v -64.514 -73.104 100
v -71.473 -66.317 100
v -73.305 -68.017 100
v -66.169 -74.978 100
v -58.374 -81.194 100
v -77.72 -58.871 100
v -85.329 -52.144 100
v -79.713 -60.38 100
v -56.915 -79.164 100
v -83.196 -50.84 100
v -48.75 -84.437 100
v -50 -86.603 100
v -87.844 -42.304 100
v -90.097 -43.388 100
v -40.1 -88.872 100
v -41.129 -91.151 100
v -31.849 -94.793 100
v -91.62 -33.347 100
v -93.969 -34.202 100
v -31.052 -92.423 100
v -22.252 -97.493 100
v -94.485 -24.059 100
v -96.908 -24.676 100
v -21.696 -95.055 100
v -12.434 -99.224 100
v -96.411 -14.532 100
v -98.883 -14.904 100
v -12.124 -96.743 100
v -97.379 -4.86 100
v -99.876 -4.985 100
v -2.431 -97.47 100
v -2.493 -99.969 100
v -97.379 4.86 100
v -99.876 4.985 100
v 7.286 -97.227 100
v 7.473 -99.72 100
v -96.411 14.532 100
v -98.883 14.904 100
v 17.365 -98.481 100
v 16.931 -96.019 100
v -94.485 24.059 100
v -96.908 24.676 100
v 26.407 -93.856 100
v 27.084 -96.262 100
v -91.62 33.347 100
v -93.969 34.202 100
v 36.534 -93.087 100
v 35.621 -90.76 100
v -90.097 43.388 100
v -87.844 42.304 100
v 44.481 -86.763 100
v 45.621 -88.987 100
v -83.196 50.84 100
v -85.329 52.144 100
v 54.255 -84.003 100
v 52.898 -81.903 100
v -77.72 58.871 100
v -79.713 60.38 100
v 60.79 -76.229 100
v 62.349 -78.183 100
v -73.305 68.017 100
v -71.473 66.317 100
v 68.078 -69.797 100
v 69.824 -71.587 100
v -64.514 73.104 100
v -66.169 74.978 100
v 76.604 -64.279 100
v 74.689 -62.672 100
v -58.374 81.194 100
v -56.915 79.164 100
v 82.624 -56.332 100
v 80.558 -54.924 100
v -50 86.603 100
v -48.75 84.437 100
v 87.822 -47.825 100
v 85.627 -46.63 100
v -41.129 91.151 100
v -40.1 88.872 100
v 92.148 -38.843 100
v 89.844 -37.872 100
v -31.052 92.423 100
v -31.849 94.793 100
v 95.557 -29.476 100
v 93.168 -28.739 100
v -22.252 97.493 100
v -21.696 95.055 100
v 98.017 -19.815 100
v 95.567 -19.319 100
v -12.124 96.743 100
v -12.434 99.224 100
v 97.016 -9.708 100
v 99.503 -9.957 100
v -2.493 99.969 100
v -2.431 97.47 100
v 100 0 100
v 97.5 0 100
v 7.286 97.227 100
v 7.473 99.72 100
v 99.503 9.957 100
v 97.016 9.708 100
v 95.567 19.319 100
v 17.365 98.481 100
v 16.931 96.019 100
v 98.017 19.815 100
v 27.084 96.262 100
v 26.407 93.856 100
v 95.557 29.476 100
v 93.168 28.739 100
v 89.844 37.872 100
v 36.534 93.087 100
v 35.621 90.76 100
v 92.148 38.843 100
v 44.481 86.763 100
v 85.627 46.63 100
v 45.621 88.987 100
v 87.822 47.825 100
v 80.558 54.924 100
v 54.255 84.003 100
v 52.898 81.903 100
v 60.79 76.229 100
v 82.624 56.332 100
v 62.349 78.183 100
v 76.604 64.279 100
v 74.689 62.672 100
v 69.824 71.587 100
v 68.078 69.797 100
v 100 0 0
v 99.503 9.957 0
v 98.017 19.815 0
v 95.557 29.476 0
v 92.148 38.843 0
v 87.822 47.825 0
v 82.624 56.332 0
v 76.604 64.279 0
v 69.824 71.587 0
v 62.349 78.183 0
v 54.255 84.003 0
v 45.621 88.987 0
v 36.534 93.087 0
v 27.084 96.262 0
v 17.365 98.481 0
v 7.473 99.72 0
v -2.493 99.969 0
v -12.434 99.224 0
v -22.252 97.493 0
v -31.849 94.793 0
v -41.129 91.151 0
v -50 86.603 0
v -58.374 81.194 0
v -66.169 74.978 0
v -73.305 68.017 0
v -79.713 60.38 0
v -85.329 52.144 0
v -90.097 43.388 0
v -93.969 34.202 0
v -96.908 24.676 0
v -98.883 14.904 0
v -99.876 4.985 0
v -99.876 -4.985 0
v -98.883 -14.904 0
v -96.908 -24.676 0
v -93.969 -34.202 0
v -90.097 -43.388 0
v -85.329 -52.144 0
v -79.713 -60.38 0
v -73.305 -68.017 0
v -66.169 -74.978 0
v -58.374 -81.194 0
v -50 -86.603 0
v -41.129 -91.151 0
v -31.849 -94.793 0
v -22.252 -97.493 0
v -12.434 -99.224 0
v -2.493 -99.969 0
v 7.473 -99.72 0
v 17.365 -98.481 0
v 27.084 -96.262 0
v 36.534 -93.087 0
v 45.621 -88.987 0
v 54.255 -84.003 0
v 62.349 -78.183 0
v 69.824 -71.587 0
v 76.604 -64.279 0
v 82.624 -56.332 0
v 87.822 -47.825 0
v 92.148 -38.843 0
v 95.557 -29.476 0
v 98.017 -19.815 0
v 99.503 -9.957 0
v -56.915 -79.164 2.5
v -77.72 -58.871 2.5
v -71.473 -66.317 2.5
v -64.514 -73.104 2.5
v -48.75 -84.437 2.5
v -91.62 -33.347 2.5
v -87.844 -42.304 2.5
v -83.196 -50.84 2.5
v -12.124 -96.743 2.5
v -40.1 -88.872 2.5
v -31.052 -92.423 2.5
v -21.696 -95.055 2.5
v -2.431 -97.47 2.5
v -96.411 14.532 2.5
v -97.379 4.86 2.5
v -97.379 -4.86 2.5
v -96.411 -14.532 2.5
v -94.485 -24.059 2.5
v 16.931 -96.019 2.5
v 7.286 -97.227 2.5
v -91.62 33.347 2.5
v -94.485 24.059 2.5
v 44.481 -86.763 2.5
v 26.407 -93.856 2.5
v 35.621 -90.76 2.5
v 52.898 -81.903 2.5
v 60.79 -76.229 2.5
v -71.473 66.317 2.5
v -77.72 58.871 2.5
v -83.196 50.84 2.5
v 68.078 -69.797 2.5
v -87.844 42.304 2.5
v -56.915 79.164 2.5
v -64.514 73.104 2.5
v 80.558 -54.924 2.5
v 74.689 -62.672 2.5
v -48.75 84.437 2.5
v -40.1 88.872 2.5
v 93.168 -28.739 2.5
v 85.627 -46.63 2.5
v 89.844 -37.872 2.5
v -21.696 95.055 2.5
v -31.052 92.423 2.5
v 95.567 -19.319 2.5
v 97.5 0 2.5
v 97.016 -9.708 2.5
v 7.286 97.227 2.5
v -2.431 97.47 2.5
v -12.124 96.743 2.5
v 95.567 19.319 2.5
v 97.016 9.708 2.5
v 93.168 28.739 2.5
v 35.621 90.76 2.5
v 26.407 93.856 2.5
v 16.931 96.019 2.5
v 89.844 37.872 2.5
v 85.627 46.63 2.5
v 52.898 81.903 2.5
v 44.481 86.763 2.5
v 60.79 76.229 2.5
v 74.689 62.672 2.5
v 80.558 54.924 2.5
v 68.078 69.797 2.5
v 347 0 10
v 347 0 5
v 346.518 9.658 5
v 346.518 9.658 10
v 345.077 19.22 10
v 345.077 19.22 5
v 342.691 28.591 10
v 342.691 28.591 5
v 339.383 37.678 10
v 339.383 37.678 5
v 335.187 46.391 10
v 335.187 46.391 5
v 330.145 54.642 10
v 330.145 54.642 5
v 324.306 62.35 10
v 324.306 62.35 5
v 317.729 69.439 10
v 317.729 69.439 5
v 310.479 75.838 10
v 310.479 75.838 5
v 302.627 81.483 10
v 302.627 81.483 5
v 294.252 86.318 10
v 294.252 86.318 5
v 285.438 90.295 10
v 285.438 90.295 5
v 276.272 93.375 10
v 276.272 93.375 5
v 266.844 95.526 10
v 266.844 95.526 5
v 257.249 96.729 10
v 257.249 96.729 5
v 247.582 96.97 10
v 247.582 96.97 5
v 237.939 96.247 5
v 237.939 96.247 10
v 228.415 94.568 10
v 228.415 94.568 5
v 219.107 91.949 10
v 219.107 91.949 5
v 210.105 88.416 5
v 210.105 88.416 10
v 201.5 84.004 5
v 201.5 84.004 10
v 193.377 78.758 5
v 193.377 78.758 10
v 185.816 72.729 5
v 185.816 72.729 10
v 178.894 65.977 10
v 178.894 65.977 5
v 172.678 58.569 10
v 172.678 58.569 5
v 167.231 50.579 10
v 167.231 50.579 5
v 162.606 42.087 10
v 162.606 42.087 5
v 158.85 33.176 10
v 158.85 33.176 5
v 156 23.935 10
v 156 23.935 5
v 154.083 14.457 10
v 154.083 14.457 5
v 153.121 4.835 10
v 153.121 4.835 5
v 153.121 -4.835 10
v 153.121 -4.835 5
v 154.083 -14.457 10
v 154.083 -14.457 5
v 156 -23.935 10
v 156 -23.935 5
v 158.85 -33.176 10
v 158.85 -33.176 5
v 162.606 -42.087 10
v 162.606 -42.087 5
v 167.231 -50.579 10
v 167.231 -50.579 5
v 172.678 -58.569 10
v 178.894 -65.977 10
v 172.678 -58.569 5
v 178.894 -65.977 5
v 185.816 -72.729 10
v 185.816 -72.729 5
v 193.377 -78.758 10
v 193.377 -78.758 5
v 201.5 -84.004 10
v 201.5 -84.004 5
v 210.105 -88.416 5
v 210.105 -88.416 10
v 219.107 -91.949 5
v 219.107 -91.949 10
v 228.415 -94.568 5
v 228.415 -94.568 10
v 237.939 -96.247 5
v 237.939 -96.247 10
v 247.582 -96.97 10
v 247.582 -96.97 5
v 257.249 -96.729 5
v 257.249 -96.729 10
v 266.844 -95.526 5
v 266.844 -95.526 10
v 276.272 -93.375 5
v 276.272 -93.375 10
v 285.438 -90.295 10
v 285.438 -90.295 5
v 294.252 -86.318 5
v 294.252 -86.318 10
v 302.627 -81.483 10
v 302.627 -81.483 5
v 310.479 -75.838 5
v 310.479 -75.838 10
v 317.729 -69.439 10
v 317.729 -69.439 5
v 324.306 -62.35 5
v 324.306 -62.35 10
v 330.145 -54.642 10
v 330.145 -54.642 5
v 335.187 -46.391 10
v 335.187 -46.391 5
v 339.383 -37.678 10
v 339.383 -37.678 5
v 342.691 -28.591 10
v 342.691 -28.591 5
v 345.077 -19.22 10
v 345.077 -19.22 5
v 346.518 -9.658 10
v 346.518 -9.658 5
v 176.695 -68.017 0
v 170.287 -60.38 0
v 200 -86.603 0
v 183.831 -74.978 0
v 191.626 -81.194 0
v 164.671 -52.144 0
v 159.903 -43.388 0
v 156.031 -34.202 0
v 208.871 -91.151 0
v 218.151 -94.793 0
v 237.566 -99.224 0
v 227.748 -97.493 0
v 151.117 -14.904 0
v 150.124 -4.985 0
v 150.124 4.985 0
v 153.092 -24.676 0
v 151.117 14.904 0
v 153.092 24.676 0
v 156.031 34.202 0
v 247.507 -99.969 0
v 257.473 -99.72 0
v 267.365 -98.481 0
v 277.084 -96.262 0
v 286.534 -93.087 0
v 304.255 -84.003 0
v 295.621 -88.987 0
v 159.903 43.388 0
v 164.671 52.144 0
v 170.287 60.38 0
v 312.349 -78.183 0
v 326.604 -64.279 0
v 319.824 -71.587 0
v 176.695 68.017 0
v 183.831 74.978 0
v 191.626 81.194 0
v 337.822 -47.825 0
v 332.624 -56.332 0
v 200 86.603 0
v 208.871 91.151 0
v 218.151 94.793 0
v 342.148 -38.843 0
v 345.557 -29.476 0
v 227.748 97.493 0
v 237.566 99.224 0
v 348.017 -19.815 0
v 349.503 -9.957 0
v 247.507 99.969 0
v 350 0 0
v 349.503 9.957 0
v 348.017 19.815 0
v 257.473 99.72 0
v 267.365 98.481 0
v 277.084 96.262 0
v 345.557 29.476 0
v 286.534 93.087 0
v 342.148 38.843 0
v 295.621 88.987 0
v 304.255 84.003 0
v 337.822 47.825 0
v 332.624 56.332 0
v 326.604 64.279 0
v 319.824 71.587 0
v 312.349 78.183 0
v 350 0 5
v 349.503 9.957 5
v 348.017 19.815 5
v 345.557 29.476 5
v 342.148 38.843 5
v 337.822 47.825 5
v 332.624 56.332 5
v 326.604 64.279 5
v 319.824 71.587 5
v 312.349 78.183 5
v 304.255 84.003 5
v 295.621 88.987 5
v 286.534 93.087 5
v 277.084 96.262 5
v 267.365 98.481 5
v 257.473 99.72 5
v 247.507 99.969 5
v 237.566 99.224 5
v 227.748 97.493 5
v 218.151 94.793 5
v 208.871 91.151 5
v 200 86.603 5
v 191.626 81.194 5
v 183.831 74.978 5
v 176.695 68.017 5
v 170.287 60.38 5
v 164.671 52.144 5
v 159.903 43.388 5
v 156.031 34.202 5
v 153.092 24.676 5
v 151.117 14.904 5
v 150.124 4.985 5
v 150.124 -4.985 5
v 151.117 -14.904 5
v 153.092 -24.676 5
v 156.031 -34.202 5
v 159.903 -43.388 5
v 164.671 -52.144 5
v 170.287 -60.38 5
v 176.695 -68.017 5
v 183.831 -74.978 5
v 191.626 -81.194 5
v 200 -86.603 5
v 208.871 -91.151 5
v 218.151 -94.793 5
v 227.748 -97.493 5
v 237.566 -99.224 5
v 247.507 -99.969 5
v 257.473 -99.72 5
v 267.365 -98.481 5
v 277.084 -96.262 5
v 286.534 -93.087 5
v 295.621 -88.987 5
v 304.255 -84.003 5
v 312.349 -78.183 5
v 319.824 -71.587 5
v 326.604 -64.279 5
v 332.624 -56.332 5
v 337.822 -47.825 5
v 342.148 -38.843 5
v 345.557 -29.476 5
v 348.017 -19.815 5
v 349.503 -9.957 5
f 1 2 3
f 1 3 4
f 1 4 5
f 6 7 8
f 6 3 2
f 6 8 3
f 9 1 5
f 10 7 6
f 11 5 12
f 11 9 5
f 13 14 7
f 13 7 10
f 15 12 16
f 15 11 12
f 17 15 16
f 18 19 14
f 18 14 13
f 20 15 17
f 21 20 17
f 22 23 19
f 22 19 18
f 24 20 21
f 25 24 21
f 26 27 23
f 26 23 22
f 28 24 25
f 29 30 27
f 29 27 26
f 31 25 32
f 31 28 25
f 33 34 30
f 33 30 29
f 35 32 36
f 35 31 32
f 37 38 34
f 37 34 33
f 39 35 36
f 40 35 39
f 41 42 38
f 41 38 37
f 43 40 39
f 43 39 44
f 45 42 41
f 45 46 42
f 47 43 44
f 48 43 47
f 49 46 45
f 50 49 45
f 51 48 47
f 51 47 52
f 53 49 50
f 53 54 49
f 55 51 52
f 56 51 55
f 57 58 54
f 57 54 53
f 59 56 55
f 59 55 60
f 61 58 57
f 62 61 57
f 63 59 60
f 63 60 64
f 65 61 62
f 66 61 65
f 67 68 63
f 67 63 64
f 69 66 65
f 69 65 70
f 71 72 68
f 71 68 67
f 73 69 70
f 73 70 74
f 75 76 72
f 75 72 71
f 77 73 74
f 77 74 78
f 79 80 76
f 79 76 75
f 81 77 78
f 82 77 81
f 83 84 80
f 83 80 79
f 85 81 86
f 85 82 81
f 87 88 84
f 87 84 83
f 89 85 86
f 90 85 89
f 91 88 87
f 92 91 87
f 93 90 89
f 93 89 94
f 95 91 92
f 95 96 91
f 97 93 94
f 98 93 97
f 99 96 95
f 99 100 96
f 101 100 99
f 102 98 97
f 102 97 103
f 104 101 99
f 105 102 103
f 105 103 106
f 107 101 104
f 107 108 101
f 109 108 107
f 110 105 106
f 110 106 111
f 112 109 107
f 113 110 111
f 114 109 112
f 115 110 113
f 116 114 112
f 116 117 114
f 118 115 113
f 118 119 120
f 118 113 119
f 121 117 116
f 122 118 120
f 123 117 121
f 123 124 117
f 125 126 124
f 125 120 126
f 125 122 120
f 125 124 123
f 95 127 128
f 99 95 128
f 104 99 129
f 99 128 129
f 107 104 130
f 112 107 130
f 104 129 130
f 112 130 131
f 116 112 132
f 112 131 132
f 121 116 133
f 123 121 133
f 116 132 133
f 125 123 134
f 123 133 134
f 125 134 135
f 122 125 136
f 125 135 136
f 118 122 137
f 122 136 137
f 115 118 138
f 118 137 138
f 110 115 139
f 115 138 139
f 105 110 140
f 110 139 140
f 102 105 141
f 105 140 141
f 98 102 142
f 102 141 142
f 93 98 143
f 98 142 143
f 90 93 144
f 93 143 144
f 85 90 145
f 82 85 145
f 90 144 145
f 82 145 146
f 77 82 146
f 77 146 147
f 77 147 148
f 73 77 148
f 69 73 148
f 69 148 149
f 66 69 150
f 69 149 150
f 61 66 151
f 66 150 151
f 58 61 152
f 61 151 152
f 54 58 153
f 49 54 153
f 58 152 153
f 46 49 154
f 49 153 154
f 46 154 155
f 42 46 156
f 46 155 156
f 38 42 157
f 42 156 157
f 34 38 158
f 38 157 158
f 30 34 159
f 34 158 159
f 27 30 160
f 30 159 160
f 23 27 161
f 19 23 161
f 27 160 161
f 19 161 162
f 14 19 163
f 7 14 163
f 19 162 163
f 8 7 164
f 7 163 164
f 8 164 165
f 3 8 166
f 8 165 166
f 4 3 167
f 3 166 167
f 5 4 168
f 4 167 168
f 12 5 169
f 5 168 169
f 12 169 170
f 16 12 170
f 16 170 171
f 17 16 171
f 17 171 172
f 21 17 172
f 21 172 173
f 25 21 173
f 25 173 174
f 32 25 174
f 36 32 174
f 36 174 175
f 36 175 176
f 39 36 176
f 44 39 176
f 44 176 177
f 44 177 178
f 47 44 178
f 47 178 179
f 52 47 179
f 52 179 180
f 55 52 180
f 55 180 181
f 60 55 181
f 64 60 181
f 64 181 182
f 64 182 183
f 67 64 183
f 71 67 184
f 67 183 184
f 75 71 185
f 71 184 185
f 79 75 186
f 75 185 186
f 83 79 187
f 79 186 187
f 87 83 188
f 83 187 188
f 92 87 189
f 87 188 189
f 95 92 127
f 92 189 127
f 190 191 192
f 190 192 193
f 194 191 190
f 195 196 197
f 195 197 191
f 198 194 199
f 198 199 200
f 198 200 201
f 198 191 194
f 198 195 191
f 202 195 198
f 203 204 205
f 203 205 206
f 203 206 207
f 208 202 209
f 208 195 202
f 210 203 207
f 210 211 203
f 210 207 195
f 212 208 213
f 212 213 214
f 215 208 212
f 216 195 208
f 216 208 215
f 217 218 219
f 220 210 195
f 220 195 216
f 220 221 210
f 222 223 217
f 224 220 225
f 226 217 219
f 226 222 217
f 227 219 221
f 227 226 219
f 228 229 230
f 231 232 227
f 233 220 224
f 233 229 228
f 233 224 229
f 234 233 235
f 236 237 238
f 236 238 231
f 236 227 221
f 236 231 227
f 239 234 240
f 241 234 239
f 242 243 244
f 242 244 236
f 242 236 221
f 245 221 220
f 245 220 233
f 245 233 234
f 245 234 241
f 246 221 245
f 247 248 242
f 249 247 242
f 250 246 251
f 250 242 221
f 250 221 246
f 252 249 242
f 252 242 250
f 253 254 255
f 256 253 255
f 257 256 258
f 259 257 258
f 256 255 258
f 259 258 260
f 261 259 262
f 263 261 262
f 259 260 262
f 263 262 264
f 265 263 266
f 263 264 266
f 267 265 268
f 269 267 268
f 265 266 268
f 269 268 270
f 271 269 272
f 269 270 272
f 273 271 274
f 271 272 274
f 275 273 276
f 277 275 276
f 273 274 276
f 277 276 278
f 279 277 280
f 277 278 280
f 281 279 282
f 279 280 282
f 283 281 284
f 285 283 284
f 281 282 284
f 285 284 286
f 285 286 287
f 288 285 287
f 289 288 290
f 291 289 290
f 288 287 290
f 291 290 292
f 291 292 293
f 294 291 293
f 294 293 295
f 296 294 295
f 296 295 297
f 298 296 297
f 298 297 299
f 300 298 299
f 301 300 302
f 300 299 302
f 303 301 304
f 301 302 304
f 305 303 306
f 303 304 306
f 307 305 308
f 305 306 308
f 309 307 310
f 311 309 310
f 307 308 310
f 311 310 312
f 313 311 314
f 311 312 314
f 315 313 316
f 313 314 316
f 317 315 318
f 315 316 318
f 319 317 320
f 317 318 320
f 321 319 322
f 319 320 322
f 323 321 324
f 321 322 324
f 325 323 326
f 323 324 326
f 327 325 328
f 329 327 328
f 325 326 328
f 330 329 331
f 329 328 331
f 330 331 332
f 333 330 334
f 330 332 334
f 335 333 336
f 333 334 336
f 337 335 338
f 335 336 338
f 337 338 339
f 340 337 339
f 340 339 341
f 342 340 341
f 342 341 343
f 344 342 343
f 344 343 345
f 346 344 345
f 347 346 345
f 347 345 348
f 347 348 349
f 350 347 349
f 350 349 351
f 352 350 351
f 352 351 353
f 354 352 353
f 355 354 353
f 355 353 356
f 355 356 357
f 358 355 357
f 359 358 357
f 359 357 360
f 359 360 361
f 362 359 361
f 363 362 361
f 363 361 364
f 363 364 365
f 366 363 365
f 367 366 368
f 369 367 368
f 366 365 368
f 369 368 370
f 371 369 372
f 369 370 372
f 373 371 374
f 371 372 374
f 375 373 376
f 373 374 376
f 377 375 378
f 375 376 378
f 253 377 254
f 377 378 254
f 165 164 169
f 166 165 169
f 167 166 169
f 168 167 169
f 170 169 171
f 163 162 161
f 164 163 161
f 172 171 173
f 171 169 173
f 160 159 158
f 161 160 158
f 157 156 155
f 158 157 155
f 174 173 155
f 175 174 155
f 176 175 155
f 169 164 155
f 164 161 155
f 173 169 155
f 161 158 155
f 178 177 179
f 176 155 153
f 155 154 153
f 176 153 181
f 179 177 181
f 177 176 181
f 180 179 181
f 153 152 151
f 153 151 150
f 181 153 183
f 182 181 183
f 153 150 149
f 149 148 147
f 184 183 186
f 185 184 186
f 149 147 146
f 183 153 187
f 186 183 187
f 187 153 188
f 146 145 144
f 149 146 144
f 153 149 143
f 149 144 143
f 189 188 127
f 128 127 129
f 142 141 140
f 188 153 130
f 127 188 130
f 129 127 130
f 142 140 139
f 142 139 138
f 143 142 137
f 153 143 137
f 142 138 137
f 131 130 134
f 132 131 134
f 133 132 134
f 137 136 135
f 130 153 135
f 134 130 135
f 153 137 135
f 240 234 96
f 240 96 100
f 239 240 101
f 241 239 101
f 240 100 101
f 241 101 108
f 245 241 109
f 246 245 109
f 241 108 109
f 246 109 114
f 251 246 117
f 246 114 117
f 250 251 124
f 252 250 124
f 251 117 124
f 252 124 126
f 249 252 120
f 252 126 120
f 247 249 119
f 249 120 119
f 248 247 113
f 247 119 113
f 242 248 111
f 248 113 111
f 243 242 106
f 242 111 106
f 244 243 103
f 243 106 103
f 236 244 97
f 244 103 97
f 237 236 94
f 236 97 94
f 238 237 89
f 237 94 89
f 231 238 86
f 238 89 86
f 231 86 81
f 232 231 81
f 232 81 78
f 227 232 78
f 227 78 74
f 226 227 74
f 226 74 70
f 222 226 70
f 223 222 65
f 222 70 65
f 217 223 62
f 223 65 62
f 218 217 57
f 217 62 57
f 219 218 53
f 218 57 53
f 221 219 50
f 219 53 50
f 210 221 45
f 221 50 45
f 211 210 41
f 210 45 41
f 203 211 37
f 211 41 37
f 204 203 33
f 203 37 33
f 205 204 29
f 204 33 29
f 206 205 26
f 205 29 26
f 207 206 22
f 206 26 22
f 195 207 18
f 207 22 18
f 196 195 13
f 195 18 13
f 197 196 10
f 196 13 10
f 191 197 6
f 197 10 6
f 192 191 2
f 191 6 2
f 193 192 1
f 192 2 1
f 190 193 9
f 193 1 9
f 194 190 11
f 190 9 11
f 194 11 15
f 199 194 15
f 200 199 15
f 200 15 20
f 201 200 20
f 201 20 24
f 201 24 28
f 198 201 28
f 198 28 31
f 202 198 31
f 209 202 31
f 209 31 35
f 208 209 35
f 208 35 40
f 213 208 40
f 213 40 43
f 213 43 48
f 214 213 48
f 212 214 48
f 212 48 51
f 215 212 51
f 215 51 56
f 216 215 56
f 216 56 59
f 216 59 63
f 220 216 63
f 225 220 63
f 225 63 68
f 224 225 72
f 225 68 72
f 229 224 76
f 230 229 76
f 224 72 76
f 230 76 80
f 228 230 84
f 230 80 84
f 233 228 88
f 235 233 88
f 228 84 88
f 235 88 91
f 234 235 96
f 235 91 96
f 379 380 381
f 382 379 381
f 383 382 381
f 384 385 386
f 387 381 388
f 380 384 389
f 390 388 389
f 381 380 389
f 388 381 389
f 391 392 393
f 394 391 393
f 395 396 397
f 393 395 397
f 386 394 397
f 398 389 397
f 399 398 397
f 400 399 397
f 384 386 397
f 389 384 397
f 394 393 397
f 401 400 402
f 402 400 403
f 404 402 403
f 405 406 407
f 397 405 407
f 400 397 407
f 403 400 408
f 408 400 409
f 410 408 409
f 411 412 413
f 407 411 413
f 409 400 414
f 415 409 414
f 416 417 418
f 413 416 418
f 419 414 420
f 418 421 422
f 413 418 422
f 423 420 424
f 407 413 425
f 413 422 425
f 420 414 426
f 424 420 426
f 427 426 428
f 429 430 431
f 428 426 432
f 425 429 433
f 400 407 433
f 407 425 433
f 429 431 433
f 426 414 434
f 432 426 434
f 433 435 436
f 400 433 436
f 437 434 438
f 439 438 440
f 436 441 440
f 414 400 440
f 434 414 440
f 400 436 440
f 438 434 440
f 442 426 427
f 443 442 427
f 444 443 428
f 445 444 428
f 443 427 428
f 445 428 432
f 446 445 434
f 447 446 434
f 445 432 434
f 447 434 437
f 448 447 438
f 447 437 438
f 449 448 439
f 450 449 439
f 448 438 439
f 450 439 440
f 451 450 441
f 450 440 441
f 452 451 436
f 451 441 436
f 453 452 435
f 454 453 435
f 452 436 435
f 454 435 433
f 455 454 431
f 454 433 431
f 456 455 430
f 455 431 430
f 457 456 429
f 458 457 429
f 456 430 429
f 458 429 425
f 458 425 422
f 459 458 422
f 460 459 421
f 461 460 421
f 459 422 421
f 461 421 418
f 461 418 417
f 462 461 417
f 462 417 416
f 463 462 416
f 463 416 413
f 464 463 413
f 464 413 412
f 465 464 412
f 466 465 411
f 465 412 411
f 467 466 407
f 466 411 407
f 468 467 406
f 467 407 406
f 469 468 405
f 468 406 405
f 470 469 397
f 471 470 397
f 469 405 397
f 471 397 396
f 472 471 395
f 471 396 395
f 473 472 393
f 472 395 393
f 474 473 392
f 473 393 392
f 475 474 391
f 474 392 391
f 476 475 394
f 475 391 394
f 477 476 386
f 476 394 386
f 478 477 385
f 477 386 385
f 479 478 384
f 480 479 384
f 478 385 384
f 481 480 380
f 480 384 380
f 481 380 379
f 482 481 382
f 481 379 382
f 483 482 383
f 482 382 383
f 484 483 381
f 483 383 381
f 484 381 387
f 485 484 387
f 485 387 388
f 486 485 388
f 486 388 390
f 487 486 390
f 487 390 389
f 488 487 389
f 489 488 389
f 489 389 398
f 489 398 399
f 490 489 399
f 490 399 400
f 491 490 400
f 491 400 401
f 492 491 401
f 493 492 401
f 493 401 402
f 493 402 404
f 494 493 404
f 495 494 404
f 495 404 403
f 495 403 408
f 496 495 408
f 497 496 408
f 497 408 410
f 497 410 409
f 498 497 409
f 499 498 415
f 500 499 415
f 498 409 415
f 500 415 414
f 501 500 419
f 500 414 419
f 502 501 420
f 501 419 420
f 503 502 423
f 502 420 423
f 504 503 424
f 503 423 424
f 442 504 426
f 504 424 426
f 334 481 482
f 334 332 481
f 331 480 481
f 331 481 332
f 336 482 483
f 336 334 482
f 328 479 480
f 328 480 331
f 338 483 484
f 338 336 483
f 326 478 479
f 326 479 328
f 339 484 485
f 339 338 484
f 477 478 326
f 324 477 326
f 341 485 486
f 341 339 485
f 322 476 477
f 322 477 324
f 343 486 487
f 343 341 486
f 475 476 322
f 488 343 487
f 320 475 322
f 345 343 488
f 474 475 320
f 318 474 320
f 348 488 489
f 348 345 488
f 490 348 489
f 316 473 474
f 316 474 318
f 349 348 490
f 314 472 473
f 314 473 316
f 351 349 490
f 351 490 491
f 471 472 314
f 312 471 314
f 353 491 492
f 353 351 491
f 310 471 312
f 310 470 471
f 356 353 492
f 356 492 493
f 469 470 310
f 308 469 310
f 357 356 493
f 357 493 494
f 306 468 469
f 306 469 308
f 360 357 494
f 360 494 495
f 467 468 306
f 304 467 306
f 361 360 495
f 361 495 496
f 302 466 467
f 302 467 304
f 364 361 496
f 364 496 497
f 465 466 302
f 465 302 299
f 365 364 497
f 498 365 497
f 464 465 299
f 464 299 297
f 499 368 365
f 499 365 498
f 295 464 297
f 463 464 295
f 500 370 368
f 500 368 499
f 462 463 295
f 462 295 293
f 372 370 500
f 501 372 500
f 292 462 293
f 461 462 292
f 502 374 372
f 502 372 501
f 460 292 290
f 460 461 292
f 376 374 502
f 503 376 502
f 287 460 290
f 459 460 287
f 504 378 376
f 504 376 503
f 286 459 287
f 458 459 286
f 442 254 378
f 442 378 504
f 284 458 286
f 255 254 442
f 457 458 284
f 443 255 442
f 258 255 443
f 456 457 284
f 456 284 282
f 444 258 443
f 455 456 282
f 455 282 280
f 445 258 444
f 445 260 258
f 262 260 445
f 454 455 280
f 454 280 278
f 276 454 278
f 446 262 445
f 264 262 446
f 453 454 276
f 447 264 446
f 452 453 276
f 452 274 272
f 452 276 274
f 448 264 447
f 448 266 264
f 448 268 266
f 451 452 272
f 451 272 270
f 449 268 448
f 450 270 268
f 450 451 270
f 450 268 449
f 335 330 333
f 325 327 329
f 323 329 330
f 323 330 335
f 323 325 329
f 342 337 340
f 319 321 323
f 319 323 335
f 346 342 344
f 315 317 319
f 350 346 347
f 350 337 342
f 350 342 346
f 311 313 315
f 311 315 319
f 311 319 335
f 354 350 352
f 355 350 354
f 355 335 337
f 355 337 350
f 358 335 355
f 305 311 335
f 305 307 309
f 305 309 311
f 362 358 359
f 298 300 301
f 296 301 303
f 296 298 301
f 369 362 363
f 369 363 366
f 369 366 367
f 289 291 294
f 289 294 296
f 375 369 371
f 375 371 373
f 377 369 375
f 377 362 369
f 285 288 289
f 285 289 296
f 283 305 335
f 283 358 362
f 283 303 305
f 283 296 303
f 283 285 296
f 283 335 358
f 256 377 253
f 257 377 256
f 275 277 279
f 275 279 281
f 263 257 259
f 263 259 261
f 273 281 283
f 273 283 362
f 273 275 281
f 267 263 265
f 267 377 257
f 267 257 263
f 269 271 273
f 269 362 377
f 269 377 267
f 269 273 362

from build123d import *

# Parameters (mm, degrees)
SKETCH_R     = 100
PAD_DEPTH    = 100
SKETCH001_R  = 97.5
POCKET_DEPTH = 97.5
SKETCH002_R  = 100
PAD001_DEPTH = 5
SKETCH003_R  = 97
PAD002_DEPTH = 5


with BuildPart() as box:
    # Sketch → Pad (new body)
    with BuildSketch(Plane.XY):
        Circle(SKETCH_R)
    extrude(amount=PAD_DEPTH)

    # Sketch001 (on Face3 of Pad) → Pocket (cut)
    with BuildSketch(Plane.XY.offset(100)):
        Circle(SKETCH001_R)
    extrude(amount=-POCKET_DEPTH, mode=Mode.SUBTRACT)


with BuildPart() as lid:
    # Sketch002 → Pad001 (new body)
    with BuildSketch(Plane.XY):
        with Locations((250, 0)):
            Circle(SKETCH002_R)
    extrude(amount=PAD001_DEPTH)

    # Sketch003 (on Face3 of Pad001) → Pad002 (join)
    with BuildSketch(Plane.XY.offset(5)):
        with Locations((250, 0)):
            Circle(SKETCH003_R)
    extrude(amount=PAD002_DEPTH)


solid = Compound([box.part, lid.part])
